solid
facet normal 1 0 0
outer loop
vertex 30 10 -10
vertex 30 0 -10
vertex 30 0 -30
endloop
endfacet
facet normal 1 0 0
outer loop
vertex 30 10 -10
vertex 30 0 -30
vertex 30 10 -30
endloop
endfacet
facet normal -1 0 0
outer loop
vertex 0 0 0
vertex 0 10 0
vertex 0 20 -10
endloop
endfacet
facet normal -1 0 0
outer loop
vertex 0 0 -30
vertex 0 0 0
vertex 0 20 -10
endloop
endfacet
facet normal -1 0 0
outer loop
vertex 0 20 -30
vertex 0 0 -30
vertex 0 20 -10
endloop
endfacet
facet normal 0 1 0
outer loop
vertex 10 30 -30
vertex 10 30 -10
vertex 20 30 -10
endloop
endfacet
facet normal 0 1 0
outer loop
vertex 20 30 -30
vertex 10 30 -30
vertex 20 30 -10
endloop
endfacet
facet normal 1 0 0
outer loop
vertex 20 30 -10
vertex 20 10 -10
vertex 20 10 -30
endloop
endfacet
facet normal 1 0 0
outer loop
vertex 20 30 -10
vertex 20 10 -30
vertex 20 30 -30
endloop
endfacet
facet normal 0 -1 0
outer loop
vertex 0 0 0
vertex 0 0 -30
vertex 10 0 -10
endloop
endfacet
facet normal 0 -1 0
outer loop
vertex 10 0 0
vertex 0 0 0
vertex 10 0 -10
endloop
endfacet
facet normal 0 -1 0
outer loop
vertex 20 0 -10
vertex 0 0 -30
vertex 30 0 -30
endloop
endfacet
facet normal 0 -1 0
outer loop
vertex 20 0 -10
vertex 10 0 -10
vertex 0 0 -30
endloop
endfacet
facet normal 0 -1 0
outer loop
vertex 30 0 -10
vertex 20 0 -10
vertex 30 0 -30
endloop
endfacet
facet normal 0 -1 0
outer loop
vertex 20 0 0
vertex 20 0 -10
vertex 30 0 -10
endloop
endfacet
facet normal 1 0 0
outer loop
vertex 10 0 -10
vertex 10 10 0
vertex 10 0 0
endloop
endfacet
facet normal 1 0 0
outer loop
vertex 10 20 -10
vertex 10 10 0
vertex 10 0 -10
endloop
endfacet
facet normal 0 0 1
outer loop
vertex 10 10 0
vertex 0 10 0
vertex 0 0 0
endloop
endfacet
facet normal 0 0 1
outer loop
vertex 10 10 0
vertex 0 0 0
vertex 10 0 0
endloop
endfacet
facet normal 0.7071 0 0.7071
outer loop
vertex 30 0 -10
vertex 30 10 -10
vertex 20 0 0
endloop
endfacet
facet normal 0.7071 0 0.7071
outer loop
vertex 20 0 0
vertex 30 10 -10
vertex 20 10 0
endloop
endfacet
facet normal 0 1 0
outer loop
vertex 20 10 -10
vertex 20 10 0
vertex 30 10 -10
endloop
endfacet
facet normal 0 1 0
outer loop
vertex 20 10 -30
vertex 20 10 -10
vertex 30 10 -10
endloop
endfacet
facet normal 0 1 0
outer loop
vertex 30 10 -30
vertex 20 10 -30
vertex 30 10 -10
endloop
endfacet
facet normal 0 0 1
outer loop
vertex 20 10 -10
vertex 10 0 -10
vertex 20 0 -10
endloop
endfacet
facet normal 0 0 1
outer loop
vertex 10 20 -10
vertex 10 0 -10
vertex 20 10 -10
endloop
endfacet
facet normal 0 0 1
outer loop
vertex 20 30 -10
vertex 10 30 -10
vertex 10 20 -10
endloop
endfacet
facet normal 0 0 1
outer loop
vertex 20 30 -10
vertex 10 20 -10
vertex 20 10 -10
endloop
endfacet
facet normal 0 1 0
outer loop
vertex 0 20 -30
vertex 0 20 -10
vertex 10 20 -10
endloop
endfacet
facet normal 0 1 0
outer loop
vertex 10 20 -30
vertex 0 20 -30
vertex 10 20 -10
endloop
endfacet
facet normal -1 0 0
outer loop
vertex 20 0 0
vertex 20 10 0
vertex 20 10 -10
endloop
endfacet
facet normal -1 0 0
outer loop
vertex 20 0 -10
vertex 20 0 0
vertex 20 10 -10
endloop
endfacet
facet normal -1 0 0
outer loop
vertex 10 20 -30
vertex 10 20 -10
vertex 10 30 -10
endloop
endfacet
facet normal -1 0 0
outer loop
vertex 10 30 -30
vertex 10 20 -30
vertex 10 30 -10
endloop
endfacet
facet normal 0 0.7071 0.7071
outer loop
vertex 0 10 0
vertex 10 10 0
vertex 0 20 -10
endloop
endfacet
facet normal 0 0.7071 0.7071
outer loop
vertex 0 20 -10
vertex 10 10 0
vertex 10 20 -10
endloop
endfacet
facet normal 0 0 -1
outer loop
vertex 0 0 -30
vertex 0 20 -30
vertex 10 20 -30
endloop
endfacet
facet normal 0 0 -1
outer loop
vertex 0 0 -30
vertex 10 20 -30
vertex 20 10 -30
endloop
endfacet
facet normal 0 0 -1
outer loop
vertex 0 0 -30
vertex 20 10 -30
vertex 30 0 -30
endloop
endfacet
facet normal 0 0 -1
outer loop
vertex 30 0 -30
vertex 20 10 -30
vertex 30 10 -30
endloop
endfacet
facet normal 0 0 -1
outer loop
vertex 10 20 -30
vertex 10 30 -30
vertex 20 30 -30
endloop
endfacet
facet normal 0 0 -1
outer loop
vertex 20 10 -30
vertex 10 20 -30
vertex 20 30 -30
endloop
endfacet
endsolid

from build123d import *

# Parameters (mm, degrees)
SKETCH_1_W           = 30
SKETCH_1_H           = 30
EXTRUDE_1_DEPTH      = 30
SKETCH_30_W          = 10
SKETCH_30_H          = 10
SKETCH_30_H_2        = 20
CUT_EXTRUDE_20_DEPTH = 52.961524227
SKETCH_32_W          = 10
SKETCH_32_H          = 10
CUT_EXTRUDE_21_DEPTH = 47.904157598
SKETCH_33_W          = 10
SKETCH_33_H          = 10
CUT_EXTRUDE_22_DEPTH = 52.961524227


with BuildPart() as part:
    # 草圖1 → 填料-伸1 (new body)
    with BuildSketch(Plane.XY):
        with Locations((15, 15)):
            Rectangle(SKETCH_1_W, SKETCH_1_H)
    extrude(amount=-EXTRUDE_1_DEPTH)

    # 草圖30 → 除料-伸長20 (cut, through all)
    with BuildSketch(Plane.XY):
        with Locations((5, 25)):
            Rectangle(SKETCH_30_W, SKETCH_30_H)
        with Locations((25, 20)):
            Rectangle(SKETCH_30_W, SKETCH_30_H_2)
    extrude(amount=-CUT_EXTRUDE_20_DEPTH, mode=Mode.SUBTRACT)

    # 草圖32 → 除料-伸長21 (cut, through all)
    with BuildSketch(Plane(origin=(20, 0, 0), x_dir=(0, 0, -1), z_dir=(1, 0, 0))):
        with Locations((5, 25)):
            Rectangle(SKETCH_32_W, SKETCH_32_H)
        Polygon((0, 10), (10, 20), (0, 20), align=None)
    extrude(amount=-CUT_EXTRUDE_21_DEPTH, mode=Mode.SUBTRACT)

    # 草圖33 → 除料-伸長22 (cut, through all)
    with BuildSketch(Plane(origin=(0, 30, 0), x_dir=(1, 0, 0), z_dir=(0, 1, 0))):
        with Locations((15, 5)):
            Rectangle(SKETCH_33_W, SKETCH_33_H)
        Polygon((30, 10), (20, 0), (30, 0), align=None)
    extrude(amount=-CUT_EXTRUDE_22_DEPTH, mode=Mode.SUBTRACT)


solid = part.part
